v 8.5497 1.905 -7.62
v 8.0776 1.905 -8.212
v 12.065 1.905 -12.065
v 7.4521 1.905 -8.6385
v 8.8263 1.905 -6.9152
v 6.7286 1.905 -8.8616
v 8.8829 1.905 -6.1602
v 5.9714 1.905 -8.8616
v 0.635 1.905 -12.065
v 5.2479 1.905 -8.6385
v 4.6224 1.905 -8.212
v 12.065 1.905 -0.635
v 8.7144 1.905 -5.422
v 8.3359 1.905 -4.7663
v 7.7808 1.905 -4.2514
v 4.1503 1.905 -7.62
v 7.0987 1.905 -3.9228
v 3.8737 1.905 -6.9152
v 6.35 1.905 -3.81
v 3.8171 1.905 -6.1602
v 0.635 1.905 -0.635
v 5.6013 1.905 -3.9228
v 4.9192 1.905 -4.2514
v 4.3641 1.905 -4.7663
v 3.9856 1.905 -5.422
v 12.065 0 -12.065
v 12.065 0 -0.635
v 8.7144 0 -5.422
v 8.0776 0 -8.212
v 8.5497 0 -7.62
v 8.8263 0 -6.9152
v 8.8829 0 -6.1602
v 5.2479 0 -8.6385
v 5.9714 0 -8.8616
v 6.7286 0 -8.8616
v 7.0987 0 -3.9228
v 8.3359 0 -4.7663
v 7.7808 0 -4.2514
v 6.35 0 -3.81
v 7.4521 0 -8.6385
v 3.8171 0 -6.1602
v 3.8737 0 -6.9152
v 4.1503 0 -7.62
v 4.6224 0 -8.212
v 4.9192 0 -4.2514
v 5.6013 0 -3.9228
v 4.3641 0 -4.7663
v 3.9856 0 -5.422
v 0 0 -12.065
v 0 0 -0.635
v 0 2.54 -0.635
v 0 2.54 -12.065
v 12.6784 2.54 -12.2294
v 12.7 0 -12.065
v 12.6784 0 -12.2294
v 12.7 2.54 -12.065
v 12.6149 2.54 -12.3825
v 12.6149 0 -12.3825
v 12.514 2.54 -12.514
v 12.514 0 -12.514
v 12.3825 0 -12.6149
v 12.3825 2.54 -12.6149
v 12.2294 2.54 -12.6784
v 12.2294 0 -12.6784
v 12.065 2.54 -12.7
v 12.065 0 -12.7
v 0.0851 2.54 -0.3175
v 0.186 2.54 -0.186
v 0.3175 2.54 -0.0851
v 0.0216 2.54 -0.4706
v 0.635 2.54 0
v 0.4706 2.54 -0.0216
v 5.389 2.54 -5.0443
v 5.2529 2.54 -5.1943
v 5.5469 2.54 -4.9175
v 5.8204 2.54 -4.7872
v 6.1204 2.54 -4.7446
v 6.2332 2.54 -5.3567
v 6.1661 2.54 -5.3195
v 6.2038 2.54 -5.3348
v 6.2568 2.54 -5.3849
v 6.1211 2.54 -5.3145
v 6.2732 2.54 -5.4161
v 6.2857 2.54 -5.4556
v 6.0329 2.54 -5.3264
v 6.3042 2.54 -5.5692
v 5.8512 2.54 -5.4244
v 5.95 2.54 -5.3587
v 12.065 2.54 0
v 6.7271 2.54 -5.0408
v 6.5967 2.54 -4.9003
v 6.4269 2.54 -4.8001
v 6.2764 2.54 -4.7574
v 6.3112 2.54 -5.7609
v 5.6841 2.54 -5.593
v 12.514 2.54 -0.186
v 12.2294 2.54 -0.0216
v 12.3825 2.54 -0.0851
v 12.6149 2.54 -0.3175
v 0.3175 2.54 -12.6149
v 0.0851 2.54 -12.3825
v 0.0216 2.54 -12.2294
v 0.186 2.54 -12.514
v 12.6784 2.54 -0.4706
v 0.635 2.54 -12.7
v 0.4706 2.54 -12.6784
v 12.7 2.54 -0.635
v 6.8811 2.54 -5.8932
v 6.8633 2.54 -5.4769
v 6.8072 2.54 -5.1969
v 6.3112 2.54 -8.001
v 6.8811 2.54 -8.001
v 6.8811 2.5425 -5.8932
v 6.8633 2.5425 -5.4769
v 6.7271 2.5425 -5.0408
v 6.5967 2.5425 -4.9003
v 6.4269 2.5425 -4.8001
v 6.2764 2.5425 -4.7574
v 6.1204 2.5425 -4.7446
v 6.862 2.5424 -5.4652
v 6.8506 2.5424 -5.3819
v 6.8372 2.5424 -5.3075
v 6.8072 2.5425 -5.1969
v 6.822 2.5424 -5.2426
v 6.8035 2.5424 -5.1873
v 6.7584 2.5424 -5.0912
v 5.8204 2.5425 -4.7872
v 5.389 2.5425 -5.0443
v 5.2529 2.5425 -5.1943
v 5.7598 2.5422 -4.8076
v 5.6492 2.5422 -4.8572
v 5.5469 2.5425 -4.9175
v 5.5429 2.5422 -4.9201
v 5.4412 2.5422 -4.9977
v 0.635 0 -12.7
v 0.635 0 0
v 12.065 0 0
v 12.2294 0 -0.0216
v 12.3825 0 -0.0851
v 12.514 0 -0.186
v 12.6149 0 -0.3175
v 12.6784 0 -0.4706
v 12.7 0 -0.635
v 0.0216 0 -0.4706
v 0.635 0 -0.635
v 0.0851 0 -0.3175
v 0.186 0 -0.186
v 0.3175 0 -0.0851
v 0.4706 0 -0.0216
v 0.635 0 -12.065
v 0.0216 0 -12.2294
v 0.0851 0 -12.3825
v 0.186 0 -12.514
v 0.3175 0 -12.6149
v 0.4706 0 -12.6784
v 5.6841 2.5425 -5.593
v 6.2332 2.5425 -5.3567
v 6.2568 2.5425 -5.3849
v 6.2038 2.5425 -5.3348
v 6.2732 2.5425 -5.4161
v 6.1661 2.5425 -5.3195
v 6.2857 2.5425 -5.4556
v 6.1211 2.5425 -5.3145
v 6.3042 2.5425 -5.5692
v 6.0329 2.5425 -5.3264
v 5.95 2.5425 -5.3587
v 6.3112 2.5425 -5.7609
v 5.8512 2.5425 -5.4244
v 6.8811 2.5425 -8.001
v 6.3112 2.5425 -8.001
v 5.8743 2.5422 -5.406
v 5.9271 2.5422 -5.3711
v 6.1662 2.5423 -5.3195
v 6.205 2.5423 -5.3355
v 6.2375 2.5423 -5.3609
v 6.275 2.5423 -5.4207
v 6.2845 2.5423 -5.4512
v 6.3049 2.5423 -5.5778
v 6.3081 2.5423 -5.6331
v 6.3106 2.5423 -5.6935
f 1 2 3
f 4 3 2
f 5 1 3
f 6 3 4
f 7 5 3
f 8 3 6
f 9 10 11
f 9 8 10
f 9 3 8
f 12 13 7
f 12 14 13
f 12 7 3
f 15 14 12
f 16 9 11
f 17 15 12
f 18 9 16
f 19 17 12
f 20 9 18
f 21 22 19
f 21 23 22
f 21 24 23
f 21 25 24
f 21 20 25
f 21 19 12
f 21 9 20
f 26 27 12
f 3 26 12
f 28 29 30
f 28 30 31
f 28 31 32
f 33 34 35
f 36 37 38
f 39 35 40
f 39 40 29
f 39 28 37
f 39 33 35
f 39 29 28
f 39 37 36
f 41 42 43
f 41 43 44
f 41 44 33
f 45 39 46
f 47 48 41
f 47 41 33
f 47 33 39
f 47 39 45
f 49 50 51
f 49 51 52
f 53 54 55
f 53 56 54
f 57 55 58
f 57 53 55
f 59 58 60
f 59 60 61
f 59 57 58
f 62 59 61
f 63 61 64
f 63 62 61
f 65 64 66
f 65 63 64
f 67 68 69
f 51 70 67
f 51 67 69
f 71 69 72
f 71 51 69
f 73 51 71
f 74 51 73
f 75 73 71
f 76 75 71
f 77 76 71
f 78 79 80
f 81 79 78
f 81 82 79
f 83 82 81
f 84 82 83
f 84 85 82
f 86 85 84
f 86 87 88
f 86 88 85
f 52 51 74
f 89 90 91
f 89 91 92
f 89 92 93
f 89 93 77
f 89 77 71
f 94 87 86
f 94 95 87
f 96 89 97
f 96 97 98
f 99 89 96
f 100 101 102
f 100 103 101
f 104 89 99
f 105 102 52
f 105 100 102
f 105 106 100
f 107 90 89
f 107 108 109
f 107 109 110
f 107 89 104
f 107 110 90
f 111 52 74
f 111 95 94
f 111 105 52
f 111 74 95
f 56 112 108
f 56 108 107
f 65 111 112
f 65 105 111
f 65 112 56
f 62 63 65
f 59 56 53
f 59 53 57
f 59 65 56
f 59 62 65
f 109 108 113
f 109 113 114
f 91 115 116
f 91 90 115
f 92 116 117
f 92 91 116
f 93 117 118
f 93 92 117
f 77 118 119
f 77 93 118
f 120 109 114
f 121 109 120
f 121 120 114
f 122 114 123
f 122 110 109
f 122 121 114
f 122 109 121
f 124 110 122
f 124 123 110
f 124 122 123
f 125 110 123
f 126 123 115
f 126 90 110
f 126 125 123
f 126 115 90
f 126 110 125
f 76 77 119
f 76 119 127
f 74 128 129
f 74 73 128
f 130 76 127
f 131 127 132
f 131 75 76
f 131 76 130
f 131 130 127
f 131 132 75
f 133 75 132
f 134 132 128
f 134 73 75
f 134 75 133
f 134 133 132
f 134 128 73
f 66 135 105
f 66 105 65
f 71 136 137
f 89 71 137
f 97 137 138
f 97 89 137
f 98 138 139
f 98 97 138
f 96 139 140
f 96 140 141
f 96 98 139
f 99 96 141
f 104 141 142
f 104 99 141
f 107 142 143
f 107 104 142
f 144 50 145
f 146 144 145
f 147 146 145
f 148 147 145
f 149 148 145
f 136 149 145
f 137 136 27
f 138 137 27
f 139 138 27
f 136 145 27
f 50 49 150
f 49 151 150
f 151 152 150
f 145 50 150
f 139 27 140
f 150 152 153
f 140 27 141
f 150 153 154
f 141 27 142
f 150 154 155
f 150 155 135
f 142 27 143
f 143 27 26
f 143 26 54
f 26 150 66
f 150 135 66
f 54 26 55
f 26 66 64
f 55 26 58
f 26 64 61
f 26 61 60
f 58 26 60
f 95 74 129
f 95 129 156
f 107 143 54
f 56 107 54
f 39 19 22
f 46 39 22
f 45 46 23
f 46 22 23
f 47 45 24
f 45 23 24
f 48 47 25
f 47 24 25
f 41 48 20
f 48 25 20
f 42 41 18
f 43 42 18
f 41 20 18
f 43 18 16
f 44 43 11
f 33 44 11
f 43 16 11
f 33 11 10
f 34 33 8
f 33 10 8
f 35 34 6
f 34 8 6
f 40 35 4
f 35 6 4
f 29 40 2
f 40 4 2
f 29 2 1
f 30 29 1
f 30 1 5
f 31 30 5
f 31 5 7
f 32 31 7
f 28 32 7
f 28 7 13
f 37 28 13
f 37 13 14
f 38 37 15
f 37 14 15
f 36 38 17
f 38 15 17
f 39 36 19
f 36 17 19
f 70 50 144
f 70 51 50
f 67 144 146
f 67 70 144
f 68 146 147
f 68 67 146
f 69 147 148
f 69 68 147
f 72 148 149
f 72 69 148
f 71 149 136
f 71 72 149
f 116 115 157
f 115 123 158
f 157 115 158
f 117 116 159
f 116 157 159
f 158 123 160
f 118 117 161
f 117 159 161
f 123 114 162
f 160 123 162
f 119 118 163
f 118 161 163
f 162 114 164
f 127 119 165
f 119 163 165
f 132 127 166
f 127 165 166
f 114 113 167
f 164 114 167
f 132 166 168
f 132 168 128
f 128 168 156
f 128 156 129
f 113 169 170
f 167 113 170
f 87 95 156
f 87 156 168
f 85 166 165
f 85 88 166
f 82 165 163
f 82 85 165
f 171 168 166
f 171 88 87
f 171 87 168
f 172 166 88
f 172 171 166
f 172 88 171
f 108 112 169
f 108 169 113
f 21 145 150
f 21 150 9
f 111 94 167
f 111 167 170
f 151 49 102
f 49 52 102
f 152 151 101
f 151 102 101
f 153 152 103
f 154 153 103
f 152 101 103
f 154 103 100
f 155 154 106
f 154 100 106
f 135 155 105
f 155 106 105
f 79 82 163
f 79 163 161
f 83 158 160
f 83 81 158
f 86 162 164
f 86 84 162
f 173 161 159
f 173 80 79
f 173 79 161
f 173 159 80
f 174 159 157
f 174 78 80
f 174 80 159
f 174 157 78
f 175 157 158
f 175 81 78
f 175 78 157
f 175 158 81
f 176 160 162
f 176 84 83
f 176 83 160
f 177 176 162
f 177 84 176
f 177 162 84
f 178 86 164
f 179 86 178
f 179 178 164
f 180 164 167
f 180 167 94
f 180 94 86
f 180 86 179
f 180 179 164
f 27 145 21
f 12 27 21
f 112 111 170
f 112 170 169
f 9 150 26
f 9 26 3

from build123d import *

# Parameters (mm, degrees)
SKETCH1_W           = 12.7
SKETCH1_H           = 12.7
BOSS_EXTRUDE1_DEPTH = 2.54
FILLET1_R           = 0.635
SHELL1_START        = 0.635
SHELL1_OUTLINE_W    = 1.905
SHELL1_OUTLINE_H    = 11.43
SHELL1_DEPTH        = 11.43
SKETCH2_R           = 2.54
BOSS_EXTRUDE2_DEPTH = 1.905
BOSS_EXTRUDE3_DEPTH = 0.00254


# Read off the part's stored shape, not the designer's step: Shell1
with BuildPart() as part:
    # Sketch1 → Boss-Extrude1 (new body)
    with BuildSketch(Plane(origin=(0, 0, 0), x_dir=(1, 0, 0), z_dir=(0, 1, 0))):
        with Locations((6.35, 6.35)):
            Rectangle(SKETCH1_W, SKETCH1_H)
    extrude(amount=BOSS_EXTRUDE1_DEPTH)

    # Fillet1
    fillet1_edges = [part.edges().sort_by_distance(p)[0] for p in [
        (0, 1.27, -12.7),
        (12.7, 1.27, -12.7),
        (12.7, 1.27, 0),
        (0, 1.27, 0),
    ]]
    fillet(fillet1_edges, radius=FILLET1_R)

    # Shell1 outline → Shell1 (cut)
    with BuildSketch(Plane.YZ.offset(SHELL1_START)):
        with Locations((0.9525, -6.35)):
            Rectangle(SHELL1_OUTLINE_W, SHELL1_OUTLINE_H)
    extrude(amount=SHELL1_DEPTH, mode=Mode.SUBTRACT)

    # Sketch2 → Boss-Extrude2 (add)
    with BuildSketch(Plane(origin=(0, 1.905, 0), x_dir=(-1, 0, 0), z_dir=(0, -1, 0))):
        with Locations(Location((-6.35, 6.35, 0), (0, 0, 270))):
            Circle(SKETCH2_R)
    extrude(amount=BOSS_EXTRUDE2_DEPTH)

    # Sketch3 → Boss-Extrude3 (add)
    with BuildSketch(Plane(origin=(0, 2.54, 0), x_dir=(1, 0, 0), z_dir=(0, 1, 0))):
        with BuildLine():
            Line((6.311248718, 8.001), (6.881120513, 8.001))
            Line((6.881120513, 8.001), (6.881120513, 5.89323758))
            add(Edge.make_bspline(
                [(6.881120513, 5.89323758), (6.880911581, 5.85295254), (6.88050901, 5.775331222), (6.876478561, 5.663585177), (6.871028683, 5.561130731), (6.863180334, 5.468132049), (6.851523386, 5.384593628), (6.83833126, 5.310307047), (6.823776683, 5.24496961), (6.799190432, 5.171846852), (6.76102099, 5.090871717), (6.703422211, 5.003407063), (6.631693296, 4.927415182), (6.549085279, 4.861407451), (6.454902126, 4.809141814), (6.351313596, 4.771364071), (6.238650837, 4.748795386), (6.160617709, 4.746019084), (6.120443429, 4.744589744)],
                knots=[0, 0, 0, 0, 1.22248561, 2.355488409, 3.392943897, 4.335991845, 5.186735882, 5.951517034, 6.625683685, 7.215700098, 8.28923535, 9.333114649, 10.380102123, 11.447198135, 12.530158036, 13.633358744, 14.781567393, 16, 16, 16, 16], degree=3))
            add(Edge.make_bspline(
                [(6.120443429, 4.744589744), (6.078585486, 4.745885617), (5.996025276, 4.748441587), (5.874942226, 4.77021188), (5.758566278, 4.80511621), (5.647499501, 4.855583683), (5.540220246, 4.918801011), (5.438675534, 4.997215953), (5.34074525, 5.088396519), (5.282691579, 5.158366196), (5.252915385, 5.194254207)],
                knots=[0, 0, 0, 0, 0.990984786, 1.954608977, 2.90473533, 3.862451285, 4.837525908, 5.848096122, 6.896271184, 8, 8, 8, 8], degree=3))
            Line((5.252915385, 5.194254207), (5.684135337, 5.59303726))
            add(Edge.make_bspline(
                [(5.684135337, 5.59303726), (5.706713527, 5.567507703), (5.74896339, 5.519735039), (5.812632688, 5.457438312), (5.870065826, 5.407390082), (5.924206265, 5.371289844), (5.975297298, 5.345843205), (6.024438185, 5.327513276), (6.073160718, 5.317137495), (6.105348309, 5.315340023), (6.121079447, 5.314461538)],
                knots=[0, 0, 0, 0, 1.529509877, 2.862124173, 3.996688592, 4.944357383, 5.774364335, 6.554177287, 7.293378699, 8, 8, 8, 8], degree=3))
            add(Edge.make_bspline(
                [(6.121079447, 5.314461538), (6.136305438, 5.315255549), (6.165580013, 5.316782171), (6.205833677, 5.333752509), (6.239770106, 5.360396654), (6.262111848, 5.391027555), (6.27634945, 5.422340582), (6.285245372, 5.452609437), (6.293687618, 5.48889359), (6.300451357, 5.531174856), (6.30556205, 5.580004736), (6.308109361, 5.634790439), (6.311207218, 5.695828017), (6.311234393, 5.738468063), (6.311248718, 5.760945913)],
                knots=[0, 0, 0, 0, 1.003927327, 1.930222208, 2.840933547, 3.835773585, 4.407906147, 5.114514582, 5.922289074, 6.876303333, 7.950072246, 9.174518422, 10.510537432, 12, 12, 12, 12], degree=3))
            Line((6.311248718, 5.760945913), (6.311248718, 8.001))
        make_face()
    extrude(amount=BOSS_EXTRUDE3_DEPTH)


solid = part.part
